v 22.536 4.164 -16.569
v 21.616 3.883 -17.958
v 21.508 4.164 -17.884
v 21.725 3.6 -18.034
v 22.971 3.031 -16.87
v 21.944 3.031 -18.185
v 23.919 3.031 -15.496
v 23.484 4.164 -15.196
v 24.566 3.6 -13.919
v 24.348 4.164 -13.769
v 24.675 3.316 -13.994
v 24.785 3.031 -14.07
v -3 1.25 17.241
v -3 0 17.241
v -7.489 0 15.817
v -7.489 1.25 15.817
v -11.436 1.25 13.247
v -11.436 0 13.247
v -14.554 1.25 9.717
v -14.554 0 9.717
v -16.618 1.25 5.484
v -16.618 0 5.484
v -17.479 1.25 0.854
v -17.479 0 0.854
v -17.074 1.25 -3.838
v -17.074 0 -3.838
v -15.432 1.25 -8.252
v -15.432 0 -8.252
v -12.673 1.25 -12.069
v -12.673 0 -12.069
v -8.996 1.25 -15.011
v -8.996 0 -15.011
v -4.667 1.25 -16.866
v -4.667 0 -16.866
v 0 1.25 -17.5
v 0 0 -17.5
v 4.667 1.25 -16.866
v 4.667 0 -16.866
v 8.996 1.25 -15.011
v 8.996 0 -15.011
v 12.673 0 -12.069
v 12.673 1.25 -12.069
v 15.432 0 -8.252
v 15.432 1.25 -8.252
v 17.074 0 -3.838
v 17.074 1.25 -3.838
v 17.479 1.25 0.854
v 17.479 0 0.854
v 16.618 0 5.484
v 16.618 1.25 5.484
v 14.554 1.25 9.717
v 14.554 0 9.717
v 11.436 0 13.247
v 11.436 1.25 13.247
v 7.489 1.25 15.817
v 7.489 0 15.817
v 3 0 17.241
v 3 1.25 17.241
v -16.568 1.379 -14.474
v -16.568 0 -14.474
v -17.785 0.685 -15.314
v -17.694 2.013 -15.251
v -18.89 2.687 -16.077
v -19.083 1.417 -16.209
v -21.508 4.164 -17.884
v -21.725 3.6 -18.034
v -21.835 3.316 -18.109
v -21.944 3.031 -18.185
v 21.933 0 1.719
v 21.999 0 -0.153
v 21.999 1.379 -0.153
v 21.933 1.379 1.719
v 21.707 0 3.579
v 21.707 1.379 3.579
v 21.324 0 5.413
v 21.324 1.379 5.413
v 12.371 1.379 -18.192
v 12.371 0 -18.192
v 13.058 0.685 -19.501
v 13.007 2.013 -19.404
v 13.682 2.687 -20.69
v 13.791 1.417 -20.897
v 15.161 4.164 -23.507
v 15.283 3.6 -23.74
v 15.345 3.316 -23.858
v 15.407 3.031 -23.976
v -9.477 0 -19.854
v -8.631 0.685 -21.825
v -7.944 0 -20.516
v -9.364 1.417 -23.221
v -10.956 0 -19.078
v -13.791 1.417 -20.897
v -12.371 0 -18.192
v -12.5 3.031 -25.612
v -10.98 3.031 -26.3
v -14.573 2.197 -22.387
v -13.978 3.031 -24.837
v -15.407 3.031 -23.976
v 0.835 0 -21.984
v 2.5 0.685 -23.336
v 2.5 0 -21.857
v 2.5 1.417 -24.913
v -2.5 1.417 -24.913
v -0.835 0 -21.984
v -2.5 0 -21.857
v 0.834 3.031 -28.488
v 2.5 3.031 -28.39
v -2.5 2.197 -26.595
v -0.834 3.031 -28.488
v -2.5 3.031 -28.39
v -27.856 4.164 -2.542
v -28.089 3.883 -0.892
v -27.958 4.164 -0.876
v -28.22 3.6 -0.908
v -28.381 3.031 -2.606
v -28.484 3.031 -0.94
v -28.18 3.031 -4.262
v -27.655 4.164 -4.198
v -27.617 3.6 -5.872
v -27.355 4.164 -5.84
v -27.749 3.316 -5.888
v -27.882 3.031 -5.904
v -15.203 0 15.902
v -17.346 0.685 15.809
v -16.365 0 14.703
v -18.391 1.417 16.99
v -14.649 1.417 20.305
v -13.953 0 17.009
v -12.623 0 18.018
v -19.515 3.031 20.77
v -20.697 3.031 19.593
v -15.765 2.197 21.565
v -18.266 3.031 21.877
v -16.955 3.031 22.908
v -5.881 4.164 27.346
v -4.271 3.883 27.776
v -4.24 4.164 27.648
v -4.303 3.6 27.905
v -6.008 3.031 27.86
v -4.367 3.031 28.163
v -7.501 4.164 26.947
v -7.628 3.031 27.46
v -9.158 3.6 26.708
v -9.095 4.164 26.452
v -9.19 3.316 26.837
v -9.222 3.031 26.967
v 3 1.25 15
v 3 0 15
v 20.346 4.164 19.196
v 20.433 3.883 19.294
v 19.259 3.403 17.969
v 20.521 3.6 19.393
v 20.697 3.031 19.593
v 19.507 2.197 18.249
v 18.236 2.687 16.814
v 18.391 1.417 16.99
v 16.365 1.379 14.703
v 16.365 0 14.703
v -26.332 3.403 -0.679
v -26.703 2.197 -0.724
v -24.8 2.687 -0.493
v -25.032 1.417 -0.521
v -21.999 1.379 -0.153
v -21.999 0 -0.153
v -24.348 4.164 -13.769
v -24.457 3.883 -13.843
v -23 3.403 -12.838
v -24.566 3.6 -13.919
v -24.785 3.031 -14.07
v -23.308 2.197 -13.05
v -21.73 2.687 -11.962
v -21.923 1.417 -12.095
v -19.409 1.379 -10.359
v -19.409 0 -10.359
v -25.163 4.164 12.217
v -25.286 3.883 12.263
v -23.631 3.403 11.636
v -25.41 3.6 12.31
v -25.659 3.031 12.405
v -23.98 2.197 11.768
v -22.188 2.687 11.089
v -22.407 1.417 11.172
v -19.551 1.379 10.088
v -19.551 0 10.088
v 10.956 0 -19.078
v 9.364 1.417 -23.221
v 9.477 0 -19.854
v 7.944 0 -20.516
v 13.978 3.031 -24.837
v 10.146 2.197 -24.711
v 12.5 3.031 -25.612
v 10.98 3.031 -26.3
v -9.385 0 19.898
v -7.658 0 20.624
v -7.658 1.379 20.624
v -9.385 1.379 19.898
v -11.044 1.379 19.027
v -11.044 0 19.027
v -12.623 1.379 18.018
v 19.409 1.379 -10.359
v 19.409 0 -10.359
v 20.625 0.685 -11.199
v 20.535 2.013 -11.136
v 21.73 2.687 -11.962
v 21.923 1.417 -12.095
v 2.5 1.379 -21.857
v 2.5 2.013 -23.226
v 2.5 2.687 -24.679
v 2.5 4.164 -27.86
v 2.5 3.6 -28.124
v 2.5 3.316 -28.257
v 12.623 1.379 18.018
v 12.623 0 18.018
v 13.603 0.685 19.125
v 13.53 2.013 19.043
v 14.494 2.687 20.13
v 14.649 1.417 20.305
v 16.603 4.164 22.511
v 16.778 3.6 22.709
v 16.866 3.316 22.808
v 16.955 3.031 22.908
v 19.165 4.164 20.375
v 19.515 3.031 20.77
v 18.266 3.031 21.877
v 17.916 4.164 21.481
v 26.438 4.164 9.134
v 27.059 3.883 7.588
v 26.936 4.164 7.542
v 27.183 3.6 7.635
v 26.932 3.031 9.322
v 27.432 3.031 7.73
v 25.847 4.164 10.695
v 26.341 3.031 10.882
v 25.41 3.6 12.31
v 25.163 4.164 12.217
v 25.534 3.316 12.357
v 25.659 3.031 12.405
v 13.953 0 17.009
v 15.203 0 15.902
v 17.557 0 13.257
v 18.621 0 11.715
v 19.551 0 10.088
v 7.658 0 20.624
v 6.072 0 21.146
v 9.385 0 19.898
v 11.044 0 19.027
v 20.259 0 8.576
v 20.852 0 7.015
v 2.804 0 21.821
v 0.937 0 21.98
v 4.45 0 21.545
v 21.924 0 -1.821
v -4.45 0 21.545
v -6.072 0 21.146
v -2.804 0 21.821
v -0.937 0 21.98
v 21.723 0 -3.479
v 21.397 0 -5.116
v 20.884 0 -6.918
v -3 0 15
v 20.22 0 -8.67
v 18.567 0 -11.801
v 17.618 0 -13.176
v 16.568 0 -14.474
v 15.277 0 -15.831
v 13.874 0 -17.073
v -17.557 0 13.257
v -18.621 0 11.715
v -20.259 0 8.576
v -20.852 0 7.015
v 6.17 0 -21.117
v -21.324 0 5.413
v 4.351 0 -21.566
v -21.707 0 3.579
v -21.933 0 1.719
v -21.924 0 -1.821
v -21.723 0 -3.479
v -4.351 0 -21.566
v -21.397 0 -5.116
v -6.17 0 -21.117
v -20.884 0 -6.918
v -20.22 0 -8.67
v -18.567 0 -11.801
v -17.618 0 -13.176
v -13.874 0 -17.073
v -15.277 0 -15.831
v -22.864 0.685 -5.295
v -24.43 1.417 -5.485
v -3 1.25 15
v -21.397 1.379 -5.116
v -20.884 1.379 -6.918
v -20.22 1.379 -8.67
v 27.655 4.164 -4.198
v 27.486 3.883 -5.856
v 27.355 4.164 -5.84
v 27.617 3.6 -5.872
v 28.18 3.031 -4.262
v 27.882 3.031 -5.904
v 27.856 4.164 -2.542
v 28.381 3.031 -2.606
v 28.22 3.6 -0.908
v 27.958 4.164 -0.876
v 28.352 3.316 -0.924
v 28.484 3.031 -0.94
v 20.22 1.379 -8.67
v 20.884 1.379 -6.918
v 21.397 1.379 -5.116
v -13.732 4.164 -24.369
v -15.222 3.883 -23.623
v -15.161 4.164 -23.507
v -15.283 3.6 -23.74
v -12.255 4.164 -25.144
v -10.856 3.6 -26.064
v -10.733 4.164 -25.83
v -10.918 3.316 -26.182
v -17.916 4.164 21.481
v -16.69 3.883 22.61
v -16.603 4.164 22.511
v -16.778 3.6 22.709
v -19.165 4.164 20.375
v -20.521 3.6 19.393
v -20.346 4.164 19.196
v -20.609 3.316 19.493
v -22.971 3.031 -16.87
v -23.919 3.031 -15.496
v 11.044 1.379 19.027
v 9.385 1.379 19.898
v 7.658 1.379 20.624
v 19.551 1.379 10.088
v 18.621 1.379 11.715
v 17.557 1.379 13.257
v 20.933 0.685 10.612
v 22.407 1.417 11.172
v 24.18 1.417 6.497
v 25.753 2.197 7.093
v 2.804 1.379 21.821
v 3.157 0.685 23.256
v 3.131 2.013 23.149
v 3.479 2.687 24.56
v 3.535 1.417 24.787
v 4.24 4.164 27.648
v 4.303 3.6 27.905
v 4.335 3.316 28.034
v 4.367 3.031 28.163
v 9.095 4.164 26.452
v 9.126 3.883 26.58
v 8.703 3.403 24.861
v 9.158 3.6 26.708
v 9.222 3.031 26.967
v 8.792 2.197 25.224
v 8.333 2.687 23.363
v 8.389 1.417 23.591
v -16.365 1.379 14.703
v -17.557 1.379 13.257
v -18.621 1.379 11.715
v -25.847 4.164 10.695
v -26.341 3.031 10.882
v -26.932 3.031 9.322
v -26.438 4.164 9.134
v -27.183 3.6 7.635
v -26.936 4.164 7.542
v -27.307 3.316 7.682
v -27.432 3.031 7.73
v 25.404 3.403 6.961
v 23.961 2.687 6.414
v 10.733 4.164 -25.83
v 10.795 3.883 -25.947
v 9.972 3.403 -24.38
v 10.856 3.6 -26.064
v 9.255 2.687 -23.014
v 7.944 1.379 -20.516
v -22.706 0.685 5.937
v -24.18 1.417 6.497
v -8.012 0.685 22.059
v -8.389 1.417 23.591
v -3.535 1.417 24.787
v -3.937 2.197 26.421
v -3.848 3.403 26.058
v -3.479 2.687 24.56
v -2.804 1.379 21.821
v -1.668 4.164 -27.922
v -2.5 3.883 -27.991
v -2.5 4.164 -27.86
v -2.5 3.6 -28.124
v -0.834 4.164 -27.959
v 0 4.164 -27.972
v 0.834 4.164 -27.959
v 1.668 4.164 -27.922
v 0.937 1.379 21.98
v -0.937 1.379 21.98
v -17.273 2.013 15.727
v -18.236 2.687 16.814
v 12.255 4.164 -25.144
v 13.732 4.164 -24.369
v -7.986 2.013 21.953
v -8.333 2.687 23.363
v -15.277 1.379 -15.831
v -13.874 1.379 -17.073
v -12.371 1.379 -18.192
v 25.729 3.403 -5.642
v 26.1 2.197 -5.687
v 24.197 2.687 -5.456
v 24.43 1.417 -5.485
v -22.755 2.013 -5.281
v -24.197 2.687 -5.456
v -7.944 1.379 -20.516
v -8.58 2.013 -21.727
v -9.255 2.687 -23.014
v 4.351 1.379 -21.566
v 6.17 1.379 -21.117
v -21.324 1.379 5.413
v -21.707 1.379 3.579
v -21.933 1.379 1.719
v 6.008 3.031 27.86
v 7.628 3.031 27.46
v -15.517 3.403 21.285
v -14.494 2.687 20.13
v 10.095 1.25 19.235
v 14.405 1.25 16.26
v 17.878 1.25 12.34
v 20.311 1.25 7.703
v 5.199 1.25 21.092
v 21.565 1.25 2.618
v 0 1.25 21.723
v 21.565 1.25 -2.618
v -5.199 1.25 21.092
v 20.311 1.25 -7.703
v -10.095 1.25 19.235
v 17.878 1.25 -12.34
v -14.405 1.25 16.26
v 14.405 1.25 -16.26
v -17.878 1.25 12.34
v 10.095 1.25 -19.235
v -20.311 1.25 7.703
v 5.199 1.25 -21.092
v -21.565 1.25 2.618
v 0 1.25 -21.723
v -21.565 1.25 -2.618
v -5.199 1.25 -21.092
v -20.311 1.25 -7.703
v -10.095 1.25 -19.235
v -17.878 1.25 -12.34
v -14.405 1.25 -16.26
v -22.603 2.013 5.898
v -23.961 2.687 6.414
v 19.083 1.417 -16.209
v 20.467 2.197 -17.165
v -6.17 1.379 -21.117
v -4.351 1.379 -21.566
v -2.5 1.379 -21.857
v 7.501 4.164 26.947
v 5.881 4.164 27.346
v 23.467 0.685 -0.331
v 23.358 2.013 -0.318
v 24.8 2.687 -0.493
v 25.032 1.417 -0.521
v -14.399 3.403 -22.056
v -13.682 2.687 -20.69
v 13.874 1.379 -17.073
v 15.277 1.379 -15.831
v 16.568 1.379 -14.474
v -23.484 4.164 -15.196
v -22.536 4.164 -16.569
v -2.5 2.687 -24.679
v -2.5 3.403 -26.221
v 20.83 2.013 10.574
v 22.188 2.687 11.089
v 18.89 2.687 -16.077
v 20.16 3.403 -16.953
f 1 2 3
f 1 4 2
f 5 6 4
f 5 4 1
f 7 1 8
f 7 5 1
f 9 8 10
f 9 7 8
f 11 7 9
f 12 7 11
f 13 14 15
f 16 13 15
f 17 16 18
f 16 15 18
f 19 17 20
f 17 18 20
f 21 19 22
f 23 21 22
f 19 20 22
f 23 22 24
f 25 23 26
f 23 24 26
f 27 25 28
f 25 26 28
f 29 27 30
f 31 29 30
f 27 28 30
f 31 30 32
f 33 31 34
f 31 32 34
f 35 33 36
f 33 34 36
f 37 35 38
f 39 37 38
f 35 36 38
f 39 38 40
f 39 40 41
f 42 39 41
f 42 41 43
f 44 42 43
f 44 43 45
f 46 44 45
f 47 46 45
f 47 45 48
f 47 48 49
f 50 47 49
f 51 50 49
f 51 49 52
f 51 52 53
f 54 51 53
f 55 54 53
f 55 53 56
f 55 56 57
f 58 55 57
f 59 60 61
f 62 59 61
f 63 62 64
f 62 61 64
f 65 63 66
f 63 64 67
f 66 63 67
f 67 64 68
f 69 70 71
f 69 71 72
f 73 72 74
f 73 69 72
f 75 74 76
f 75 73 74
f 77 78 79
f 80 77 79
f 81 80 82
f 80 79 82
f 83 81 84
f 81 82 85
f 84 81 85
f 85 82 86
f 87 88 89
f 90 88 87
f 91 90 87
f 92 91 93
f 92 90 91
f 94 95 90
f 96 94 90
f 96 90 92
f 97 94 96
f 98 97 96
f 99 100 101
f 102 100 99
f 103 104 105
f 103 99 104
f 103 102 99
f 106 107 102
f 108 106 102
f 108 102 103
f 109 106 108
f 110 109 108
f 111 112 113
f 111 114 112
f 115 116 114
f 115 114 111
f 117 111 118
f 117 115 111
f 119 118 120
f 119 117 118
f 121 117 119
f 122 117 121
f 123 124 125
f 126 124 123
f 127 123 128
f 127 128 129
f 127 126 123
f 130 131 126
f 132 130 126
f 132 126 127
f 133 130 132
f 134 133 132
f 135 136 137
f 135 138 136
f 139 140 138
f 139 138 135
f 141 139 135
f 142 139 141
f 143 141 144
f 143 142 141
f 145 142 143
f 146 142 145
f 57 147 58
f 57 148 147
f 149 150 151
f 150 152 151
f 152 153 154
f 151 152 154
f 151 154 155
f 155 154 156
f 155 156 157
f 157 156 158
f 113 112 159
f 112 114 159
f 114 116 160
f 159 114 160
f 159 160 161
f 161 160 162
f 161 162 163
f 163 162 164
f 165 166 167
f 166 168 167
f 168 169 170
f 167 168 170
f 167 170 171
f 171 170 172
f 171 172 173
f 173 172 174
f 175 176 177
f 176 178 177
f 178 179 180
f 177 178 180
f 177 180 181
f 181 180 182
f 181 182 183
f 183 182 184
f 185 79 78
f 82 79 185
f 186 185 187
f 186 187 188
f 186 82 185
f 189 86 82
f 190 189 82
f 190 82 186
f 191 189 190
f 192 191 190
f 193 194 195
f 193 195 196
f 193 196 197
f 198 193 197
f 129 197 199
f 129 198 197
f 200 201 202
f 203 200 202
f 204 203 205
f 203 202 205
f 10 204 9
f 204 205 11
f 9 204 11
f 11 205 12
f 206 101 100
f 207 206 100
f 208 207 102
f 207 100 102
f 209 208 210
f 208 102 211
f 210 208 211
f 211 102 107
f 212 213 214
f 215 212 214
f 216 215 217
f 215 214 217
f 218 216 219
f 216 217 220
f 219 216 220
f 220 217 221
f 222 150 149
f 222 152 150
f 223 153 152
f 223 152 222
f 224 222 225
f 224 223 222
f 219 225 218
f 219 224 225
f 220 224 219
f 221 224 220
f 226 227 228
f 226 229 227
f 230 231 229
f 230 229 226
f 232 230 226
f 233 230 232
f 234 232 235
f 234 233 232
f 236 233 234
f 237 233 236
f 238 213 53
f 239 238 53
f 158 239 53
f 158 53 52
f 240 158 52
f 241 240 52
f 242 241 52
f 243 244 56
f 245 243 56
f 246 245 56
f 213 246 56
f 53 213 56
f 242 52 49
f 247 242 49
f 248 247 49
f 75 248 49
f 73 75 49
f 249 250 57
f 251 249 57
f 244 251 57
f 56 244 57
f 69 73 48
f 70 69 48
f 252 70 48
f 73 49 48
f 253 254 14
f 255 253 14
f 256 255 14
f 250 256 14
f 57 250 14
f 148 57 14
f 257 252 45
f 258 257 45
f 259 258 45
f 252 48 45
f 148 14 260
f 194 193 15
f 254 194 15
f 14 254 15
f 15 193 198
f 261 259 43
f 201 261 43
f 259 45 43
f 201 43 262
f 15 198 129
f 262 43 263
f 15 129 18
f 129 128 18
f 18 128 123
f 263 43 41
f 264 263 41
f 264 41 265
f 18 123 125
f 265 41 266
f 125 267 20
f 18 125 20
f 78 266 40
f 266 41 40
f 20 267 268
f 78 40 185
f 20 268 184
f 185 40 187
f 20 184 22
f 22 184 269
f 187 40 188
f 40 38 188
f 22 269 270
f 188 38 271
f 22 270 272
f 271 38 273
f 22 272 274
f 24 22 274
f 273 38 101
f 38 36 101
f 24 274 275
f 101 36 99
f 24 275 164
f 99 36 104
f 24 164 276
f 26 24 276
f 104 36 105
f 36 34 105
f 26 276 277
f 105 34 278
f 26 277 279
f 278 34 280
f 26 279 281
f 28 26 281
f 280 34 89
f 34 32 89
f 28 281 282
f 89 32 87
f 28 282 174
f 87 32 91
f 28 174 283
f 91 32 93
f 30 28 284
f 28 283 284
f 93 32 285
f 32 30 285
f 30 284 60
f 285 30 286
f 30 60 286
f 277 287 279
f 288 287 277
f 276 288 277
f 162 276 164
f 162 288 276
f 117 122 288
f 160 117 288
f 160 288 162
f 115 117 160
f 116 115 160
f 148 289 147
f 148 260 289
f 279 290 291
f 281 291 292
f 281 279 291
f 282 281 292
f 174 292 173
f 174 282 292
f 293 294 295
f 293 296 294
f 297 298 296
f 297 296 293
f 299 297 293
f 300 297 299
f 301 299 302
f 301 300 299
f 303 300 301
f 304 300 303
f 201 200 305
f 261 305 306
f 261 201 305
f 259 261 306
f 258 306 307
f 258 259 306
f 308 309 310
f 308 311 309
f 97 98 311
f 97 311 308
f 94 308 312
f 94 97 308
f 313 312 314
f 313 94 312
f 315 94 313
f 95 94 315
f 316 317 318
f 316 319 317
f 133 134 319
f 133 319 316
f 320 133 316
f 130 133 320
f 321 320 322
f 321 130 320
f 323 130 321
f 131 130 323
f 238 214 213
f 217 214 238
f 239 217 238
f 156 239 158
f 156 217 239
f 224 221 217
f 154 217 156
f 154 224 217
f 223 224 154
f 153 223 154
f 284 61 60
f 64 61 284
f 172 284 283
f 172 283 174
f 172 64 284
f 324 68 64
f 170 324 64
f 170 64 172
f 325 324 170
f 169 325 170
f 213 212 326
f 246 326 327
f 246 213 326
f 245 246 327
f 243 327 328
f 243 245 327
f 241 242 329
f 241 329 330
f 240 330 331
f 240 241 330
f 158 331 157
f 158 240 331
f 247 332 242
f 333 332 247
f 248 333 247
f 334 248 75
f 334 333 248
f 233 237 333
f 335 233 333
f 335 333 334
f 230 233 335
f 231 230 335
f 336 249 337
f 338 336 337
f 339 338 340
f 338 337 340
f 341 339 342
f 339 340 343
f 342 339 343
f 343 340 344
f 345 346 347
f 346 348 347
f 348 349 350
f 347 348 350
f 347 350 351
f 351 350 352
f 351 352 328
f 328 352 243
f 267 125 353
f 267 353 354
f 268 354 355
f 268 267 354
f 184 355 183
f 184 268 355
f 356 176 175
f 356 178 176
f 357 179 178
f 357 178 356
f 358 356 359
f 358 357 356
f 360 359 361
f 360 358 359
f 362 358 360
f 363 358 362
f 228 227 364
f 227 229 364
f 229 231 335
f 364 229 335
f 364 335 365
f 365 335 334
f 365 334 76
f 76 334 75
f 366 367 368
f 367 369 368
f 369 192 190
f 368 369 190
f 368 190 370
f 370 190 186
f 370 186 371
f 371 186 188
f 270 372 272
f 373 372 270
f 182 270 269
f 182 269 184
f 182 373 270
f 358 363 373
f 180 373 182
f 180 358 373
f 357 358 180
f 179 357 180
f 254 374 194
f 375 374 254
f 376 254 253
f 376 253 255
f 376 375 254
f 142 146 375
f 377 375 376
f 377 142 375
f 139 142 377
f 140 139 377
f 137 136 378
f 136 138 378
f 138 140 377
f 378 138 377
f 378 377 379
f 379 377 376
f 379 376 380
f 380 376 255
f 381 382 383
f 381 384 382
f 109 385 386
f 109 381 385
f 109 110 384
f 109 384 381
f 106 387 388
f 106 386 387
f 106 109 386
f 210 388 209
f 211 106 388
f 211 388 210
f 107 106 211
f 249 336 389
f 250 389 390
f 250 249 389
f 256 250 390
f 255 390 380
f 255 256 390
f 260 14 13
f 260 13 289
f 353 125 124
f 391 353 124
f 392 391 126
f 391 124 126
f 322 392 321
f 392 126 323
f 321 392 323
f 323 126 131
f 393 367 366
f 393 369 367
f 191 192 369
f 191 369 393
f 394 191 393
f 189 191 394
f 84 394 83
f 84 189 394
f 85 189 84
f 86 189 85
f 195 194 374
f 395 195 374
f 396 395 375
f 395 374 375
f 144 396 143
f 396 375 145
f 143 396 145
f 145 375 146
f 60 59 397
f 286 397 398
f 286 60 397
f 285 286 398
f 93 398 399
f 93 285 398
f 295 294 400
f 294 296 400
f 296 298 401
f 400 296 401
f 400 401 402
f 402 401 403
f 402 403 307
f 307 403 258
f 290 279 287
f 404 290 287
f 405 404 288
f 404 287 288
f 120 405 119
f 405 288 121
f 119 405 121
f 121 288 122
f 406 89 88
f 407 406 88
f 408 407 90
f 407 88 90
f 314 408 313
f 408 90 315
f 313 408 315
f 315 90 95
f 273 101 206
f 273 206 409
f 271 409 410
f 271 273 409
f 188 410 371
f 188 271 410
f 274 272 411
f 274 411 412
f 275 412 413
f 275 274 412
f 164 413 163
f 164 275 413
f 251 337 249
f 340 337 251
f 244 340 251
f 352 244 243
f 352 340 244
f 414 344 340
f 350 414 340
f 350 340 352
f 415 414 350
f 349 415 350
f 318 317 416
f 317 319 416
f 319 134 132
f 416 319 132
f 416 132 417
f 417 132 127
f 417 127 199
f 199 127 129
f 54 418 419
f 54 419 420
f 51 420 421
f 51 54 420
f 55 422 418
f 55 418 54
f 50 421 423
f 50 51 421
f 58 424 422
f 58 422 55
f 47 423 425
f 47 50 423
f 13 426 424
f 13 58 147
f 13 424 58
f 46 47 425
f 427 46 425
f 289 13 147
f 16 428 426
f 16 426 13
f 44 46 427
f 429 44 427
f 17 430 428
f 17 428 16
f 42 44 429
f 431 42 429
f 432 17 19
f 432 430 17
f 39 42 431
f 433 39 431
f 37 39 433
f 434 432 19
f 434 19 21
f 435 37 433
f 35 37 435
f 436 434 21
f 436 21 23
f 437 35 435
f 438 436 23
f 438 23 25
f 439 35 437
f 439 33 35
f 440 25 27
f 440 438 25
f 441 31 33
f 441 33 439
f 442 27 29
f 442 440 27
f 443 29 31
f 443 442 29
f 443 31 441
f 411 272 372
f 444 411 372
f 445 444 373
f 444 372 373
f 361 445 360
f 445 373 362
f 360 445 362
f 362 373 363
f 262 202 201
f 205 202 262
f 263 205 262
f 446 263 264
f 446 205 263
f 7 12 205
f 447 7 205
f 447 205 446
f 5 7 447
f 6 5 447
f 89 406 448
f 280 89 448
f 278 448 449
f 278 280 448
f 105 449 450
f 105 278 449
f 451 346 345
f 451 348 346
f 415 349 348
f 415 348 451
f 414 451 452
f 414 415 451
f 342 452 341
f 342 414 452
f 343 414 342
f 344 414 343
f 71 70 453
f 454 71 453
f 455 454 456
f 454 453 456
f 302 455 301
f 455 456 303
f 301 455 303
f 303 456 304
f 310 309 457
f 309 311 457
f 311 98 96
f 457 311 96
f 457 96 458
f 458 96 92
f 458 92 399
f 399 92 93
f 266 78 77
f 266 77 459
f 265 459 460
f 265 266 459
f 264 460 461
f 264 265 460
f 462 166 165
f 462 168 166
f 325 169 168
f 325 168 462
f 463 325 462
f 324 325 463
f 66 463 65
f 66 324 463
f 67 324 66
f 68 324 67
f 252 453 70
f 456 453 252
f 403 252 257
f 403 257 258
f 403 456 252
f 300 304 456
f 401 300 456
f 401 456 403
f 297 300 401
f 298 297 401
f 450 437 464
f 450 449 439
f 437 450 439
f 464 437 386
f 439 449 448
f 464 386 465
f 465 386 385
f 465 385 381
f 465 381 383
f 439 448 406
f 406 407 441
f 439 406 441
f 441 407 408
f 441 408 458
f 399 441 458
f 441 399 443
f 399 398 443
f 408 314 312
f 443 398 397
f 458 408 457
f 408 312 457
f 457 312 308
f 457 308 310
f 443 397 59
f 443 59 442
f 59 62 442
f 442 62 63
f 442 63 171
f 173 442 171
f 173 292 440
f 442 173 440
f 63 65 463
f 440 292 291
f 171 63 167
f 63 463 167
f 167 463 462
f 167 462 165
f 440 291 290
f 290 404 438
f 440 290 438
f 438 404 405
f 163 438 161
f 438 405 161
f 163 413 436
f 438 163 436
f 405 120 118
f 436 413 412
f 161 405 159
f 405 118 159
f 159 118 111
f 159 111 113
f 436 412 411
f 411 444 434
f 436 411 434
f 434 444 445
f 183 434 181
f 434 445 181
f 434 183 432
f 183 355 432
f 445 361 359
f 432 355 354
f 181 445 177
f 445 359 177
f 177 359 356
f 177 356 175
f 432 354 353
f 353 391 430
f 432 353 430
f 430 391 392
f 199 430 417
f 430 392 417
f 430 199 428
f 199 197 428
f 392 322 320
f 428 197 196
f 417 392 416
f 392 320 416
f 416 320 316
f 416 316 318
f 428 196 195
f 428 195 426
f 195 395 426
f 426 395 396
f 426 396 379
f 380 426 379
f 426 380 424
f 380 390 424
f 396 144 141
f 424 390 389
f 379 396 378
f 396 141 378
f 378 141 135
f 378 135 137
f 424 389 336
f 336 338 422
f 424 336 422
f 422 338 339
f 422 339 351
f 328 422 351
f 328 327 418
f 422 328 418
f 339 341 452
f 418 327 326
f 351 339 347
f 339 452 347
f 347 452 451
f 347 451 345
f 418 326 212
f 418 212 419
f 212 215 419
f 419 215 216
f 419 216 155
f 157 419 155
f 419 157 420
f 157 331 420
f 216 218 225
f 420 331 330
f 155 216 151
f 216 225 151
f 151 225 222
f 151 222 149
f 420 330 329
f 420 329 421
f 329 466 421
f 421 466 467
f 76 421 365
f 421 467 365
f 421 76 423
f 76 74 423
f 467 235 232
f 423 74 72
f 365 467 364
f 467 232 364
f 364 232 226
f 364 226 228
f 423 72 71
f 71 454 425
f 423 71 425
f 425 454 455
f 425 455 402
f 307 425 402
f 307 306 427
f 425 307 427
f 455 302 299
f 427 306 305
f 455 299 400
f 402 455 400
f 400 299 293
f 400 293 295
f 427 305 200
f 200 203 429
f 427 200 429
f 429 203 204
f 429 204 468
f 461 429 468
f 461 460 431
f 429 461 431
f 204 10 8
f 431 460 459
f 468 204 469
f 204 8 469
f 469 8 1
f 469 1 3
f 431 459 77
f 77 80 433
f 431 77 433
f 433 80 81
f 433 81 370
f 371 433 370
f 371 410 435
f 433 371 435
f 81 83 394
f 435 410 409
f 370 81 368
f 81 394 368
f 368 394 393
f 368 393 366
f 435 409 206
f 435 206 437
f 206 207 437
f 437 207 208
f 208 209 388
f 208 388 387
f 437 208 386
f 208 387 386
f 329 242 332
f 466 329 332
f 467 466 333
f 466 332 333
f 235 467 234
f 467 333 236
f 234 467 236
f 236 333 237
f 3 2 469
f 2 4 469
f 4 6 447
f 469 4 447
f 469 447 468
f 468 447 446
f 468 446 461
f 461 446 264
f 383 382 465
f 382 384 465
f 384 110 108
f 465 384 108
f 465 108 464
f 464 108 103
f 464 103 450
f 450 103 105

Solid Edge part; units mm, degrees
sketch "Sketch1" plane through (0, 0, 0) normal (1, 0, 0) x (0, 1, 0)
  line L0 (1.25, 0) -> (1.25, -21.7229)
  line L1 (1.25, -21.7229) -> (4.1639, -27.9717)
  line L2 (4.1639, -27.9717) -> (3.031, -28.5)
  line L3 (3.031, -28.5) -> (0, -22)
  line L4 (0, -22) -> (0, 0)
  line L5 (0, 0) -> (1.25, 0)
revolve "RevolvedProtrusion1" add sketch "Sketch1" angle 360 about axis through (0, -114, 0) along (0, 1, 0)
sketch "Sketch2" plane through (0, 0, 0) normal (0, -1, 0) x (1, 0, 0)
  arc A0 (3, 17.2409) -> (-3, 17.2409) centre (0, 0) cw
  line L0 (-3, 17.2409) -> (-3, 15)
  line L1 (-3, 15) -> (3, 15)
  line L2 (3, 15) -> (3, 17.2409)
extrude "Cutout1" cut sketch "Sketch2" against normal blind 114
sketch "Sketch3" plane through (0, 0, 0) normal (0, -1, 0) x (1, 0, 0)
  circle A0 centre (0, 0) radius 57
  line L0 (-28.4845, -0.9403) -> (-21.9995, -0.1529)
  arc A1 (-21.9995, -0.1529) -> (-21.3236, 5.4132) centre (0, 0) cw
  line L1 (-21.3236, 5.4132) -> (-27.4318, 7.7297)
  arc A2 (-27.4318, 7.7297) -> (-26.648, 10.1062) centre (0, 0) cw
  arc A3 (-26.648, 10.1062) -> (-25.6587, 12.4048) centre (0, 0) cw
  line L2 (-25.6587, 12.4048) -> (-19.5506, 10.0883)
  arc A4 (-19.5506, 10.0883) -> (-16.3655, 14.7028) centre (0, 0) cw
  line L3 (-16.3655, 14.7028) -> (-20.6974, 19.5925)
  arc A5 (-20.6974, 19.5925) -> (-18.899, 21.3326) centre (0, 0) cw
  arc A6 (-18.899, 21.3326) -> (-16.9549, 22.9081) centre (0, 0) cw
  line L4 (-16.9549, 22.9081) -> (-12.6229, 18.0184)
  arc A7 (-12.6229, 18.0184) -> (-7.6582, 20.6241) centre (0, 0) cw
  line L5 (-7.6582, 20.6241) -> (-9.2216, 26.9669)
  arc A8 (-9.2216, 26.9669) -> (-6.8205, 27.6718) centre (0, 0) cw
  arc A9 (-6.8205, 27.6718) -> (-4.3669, 28.1635) centre (0, 0) cw
  line L6 (-4.3669, 28.1635) -> (-2.8035, 21.8206)
  arc A10 (-2.8035, 21.8206) -> (2.8035, 21.8206) centre (0, 0) cw
  line L7 (2.8035, 21.8206) -> (4.3669, 28.1635)
  arc A11 (4.3669, 28.1635) -> (6.8205, 27.6718) centre (0, 0) cw
  arc A12 (6.8205, 27.6718) -> (9.2216, 26.9669) centre (0, 0) cw
  line L8 (9.2216, 26.9669) -> (7.6582, 20.6241)
  arc A13 (7.6582, 20.6241) -> (12.6229, 18.0184) centre (0, 0) cw
  line L9 (12.6229, 18.0184) -> (16.9549, 22.9081)
  arc A14 (16.9549, 22.9081) -> (18.899, 21.3326) centre (0, 0) cw
  arc A15 (18.899, 21.3326) -> (20.6974, 19.5925) centre (0, 0) cw
  line L10 (20.6974, 19.5925) -> (16.3655, 14.7028)
  arc A16 (16.3655, 14.7028) -> (19.5506, 10.0883) centre (0, 0) cw
  line L11 (19.5506, 10.0883) -> (25.6587, 12.4048)
  arc A17 (25.6587, 12.4048) -> (26.648, 10.1062) centre (0, 0) cw
  arc A18 (26.648, 10.1062) -> (27.4318, 7.7297) centre (0, 0) cw
  line L12 (27.4318, 7.7297) -> (21.3236, 5.4132)
  arc A19 (21.3236, 5.4132) -> (21.9995, -0.1529) centre (0, 0) cw
  line L13 (21.9995, -0.1529) -> (28.4845, -0.9403)
  arc A20 (28.4845, -0.9403) -> (28.2922, -3.4353) centre (0, 0) cw
  arc A21 (28.2922, -3.4353) -> (27.8818, -5.9038) centre (0, 0) cw
  line L14 (27.8818, -5.9038) -> (21.3968, -5.1164)
  arc A22 (21.3968, -5.1164) -> (19.4085, -10.359) centre (0, 0) cw
  line L15 (19.4085, -10.359) -> (24.7848, -14.07)
  arc A23 (24.7848, -14.07) -> (23.455, -16.1898) centre (0, 0) cw
  arc A24 (23.455, -16.1898) -> (21.9445, -18.1849) centre (0, 0) cw
  line L16 (21.9445, -18.1849) -> (16.5682, -14.4739)
  arc A25 (16.5682, -14.4739) -> (12.3713, -18.192) centre (0, 0) cw
  line L17 (12.3713, -18.192) -> (15.4072, -23.9764)
  arc A26 (15.4072, -23.9764) -> (13.2446, -25.2355) centre (0, 0) cw
  arc A27 (13.2446, -25.2355) -> (10.9799, -26.3) centre (0, 0) cw
  line L18 (10.9799, -26.3) -> (7.944, -20.5157)
  arc A28 (7.944, -20.5157) -> (2.5, -21.8575) centre (0, 0) cw
  line L19 (2.5, -21.8575) -> (2.5, -28.3901)
  arc A29 (2.5, -28.3901) -> (0, -28.5) centre (0, 0) cw
  arc A30 (0, -28.5) -> (-2.5, -28.3901) centre (0, 0) cw
  line L20 (-2.5, -28.3901) -> (-2.5, -21.8575)
  arc A31 (-2.5, -21.8575) -> (-7.944, -20.5157) centre (0, 0) cw
  line L21 (-7.944, -20.5157) -> (-10.9799, -26.3)
  arc A32 (-10.9799, -26.3) -> (-13.2446, -25.2355) centre (0, 0) cw
  arc A33 (-13.2446, -25.2355) -> (-15.4072, -23.9764) centre (0, 0) cw
  line L22 (-15.4072, -23.9764) -> (-12.3713, -18.192)
  arc A34 (-12.3713, -18.192) -> (-16.5682, -14.4739) centre (0, 0) cw
  line L23 (-16.5682, -14.4739) -> (-21.9445, -18.1849)
  arc A35 (-21.9445, -18.1849) -> (-23.455, -16.1898) centre (0, 0) cw
  arc A36 (-23.455, -16.1898) -> (-24.7848, -14.07) centre (0, 0) cw
  line L24 (-24.7848, -14.07) -> (-19.4085, -10.359)
  arc A37 (-19.4085, -10.359) -> (-21.3968, -5.1164) centre (0, 0) cw
  line L25 (-21.3968, -5.1164) -> (-27.8818, -5.9038)
  arc A38 (-27.8818, -5.9038) -> (-28.2922, -3.4353) centre (0, 0) cw
  arc A39 (-28.2922, -3.4353) -> (-28.4845, -0.9403) centre (0, 0) cw
extrude "ExtrudedCutout_2" cut sketch "Sketch3" against normal blind 114 and the other way blind 114
properties part number "sicherungsbl_din5406_65365301"
